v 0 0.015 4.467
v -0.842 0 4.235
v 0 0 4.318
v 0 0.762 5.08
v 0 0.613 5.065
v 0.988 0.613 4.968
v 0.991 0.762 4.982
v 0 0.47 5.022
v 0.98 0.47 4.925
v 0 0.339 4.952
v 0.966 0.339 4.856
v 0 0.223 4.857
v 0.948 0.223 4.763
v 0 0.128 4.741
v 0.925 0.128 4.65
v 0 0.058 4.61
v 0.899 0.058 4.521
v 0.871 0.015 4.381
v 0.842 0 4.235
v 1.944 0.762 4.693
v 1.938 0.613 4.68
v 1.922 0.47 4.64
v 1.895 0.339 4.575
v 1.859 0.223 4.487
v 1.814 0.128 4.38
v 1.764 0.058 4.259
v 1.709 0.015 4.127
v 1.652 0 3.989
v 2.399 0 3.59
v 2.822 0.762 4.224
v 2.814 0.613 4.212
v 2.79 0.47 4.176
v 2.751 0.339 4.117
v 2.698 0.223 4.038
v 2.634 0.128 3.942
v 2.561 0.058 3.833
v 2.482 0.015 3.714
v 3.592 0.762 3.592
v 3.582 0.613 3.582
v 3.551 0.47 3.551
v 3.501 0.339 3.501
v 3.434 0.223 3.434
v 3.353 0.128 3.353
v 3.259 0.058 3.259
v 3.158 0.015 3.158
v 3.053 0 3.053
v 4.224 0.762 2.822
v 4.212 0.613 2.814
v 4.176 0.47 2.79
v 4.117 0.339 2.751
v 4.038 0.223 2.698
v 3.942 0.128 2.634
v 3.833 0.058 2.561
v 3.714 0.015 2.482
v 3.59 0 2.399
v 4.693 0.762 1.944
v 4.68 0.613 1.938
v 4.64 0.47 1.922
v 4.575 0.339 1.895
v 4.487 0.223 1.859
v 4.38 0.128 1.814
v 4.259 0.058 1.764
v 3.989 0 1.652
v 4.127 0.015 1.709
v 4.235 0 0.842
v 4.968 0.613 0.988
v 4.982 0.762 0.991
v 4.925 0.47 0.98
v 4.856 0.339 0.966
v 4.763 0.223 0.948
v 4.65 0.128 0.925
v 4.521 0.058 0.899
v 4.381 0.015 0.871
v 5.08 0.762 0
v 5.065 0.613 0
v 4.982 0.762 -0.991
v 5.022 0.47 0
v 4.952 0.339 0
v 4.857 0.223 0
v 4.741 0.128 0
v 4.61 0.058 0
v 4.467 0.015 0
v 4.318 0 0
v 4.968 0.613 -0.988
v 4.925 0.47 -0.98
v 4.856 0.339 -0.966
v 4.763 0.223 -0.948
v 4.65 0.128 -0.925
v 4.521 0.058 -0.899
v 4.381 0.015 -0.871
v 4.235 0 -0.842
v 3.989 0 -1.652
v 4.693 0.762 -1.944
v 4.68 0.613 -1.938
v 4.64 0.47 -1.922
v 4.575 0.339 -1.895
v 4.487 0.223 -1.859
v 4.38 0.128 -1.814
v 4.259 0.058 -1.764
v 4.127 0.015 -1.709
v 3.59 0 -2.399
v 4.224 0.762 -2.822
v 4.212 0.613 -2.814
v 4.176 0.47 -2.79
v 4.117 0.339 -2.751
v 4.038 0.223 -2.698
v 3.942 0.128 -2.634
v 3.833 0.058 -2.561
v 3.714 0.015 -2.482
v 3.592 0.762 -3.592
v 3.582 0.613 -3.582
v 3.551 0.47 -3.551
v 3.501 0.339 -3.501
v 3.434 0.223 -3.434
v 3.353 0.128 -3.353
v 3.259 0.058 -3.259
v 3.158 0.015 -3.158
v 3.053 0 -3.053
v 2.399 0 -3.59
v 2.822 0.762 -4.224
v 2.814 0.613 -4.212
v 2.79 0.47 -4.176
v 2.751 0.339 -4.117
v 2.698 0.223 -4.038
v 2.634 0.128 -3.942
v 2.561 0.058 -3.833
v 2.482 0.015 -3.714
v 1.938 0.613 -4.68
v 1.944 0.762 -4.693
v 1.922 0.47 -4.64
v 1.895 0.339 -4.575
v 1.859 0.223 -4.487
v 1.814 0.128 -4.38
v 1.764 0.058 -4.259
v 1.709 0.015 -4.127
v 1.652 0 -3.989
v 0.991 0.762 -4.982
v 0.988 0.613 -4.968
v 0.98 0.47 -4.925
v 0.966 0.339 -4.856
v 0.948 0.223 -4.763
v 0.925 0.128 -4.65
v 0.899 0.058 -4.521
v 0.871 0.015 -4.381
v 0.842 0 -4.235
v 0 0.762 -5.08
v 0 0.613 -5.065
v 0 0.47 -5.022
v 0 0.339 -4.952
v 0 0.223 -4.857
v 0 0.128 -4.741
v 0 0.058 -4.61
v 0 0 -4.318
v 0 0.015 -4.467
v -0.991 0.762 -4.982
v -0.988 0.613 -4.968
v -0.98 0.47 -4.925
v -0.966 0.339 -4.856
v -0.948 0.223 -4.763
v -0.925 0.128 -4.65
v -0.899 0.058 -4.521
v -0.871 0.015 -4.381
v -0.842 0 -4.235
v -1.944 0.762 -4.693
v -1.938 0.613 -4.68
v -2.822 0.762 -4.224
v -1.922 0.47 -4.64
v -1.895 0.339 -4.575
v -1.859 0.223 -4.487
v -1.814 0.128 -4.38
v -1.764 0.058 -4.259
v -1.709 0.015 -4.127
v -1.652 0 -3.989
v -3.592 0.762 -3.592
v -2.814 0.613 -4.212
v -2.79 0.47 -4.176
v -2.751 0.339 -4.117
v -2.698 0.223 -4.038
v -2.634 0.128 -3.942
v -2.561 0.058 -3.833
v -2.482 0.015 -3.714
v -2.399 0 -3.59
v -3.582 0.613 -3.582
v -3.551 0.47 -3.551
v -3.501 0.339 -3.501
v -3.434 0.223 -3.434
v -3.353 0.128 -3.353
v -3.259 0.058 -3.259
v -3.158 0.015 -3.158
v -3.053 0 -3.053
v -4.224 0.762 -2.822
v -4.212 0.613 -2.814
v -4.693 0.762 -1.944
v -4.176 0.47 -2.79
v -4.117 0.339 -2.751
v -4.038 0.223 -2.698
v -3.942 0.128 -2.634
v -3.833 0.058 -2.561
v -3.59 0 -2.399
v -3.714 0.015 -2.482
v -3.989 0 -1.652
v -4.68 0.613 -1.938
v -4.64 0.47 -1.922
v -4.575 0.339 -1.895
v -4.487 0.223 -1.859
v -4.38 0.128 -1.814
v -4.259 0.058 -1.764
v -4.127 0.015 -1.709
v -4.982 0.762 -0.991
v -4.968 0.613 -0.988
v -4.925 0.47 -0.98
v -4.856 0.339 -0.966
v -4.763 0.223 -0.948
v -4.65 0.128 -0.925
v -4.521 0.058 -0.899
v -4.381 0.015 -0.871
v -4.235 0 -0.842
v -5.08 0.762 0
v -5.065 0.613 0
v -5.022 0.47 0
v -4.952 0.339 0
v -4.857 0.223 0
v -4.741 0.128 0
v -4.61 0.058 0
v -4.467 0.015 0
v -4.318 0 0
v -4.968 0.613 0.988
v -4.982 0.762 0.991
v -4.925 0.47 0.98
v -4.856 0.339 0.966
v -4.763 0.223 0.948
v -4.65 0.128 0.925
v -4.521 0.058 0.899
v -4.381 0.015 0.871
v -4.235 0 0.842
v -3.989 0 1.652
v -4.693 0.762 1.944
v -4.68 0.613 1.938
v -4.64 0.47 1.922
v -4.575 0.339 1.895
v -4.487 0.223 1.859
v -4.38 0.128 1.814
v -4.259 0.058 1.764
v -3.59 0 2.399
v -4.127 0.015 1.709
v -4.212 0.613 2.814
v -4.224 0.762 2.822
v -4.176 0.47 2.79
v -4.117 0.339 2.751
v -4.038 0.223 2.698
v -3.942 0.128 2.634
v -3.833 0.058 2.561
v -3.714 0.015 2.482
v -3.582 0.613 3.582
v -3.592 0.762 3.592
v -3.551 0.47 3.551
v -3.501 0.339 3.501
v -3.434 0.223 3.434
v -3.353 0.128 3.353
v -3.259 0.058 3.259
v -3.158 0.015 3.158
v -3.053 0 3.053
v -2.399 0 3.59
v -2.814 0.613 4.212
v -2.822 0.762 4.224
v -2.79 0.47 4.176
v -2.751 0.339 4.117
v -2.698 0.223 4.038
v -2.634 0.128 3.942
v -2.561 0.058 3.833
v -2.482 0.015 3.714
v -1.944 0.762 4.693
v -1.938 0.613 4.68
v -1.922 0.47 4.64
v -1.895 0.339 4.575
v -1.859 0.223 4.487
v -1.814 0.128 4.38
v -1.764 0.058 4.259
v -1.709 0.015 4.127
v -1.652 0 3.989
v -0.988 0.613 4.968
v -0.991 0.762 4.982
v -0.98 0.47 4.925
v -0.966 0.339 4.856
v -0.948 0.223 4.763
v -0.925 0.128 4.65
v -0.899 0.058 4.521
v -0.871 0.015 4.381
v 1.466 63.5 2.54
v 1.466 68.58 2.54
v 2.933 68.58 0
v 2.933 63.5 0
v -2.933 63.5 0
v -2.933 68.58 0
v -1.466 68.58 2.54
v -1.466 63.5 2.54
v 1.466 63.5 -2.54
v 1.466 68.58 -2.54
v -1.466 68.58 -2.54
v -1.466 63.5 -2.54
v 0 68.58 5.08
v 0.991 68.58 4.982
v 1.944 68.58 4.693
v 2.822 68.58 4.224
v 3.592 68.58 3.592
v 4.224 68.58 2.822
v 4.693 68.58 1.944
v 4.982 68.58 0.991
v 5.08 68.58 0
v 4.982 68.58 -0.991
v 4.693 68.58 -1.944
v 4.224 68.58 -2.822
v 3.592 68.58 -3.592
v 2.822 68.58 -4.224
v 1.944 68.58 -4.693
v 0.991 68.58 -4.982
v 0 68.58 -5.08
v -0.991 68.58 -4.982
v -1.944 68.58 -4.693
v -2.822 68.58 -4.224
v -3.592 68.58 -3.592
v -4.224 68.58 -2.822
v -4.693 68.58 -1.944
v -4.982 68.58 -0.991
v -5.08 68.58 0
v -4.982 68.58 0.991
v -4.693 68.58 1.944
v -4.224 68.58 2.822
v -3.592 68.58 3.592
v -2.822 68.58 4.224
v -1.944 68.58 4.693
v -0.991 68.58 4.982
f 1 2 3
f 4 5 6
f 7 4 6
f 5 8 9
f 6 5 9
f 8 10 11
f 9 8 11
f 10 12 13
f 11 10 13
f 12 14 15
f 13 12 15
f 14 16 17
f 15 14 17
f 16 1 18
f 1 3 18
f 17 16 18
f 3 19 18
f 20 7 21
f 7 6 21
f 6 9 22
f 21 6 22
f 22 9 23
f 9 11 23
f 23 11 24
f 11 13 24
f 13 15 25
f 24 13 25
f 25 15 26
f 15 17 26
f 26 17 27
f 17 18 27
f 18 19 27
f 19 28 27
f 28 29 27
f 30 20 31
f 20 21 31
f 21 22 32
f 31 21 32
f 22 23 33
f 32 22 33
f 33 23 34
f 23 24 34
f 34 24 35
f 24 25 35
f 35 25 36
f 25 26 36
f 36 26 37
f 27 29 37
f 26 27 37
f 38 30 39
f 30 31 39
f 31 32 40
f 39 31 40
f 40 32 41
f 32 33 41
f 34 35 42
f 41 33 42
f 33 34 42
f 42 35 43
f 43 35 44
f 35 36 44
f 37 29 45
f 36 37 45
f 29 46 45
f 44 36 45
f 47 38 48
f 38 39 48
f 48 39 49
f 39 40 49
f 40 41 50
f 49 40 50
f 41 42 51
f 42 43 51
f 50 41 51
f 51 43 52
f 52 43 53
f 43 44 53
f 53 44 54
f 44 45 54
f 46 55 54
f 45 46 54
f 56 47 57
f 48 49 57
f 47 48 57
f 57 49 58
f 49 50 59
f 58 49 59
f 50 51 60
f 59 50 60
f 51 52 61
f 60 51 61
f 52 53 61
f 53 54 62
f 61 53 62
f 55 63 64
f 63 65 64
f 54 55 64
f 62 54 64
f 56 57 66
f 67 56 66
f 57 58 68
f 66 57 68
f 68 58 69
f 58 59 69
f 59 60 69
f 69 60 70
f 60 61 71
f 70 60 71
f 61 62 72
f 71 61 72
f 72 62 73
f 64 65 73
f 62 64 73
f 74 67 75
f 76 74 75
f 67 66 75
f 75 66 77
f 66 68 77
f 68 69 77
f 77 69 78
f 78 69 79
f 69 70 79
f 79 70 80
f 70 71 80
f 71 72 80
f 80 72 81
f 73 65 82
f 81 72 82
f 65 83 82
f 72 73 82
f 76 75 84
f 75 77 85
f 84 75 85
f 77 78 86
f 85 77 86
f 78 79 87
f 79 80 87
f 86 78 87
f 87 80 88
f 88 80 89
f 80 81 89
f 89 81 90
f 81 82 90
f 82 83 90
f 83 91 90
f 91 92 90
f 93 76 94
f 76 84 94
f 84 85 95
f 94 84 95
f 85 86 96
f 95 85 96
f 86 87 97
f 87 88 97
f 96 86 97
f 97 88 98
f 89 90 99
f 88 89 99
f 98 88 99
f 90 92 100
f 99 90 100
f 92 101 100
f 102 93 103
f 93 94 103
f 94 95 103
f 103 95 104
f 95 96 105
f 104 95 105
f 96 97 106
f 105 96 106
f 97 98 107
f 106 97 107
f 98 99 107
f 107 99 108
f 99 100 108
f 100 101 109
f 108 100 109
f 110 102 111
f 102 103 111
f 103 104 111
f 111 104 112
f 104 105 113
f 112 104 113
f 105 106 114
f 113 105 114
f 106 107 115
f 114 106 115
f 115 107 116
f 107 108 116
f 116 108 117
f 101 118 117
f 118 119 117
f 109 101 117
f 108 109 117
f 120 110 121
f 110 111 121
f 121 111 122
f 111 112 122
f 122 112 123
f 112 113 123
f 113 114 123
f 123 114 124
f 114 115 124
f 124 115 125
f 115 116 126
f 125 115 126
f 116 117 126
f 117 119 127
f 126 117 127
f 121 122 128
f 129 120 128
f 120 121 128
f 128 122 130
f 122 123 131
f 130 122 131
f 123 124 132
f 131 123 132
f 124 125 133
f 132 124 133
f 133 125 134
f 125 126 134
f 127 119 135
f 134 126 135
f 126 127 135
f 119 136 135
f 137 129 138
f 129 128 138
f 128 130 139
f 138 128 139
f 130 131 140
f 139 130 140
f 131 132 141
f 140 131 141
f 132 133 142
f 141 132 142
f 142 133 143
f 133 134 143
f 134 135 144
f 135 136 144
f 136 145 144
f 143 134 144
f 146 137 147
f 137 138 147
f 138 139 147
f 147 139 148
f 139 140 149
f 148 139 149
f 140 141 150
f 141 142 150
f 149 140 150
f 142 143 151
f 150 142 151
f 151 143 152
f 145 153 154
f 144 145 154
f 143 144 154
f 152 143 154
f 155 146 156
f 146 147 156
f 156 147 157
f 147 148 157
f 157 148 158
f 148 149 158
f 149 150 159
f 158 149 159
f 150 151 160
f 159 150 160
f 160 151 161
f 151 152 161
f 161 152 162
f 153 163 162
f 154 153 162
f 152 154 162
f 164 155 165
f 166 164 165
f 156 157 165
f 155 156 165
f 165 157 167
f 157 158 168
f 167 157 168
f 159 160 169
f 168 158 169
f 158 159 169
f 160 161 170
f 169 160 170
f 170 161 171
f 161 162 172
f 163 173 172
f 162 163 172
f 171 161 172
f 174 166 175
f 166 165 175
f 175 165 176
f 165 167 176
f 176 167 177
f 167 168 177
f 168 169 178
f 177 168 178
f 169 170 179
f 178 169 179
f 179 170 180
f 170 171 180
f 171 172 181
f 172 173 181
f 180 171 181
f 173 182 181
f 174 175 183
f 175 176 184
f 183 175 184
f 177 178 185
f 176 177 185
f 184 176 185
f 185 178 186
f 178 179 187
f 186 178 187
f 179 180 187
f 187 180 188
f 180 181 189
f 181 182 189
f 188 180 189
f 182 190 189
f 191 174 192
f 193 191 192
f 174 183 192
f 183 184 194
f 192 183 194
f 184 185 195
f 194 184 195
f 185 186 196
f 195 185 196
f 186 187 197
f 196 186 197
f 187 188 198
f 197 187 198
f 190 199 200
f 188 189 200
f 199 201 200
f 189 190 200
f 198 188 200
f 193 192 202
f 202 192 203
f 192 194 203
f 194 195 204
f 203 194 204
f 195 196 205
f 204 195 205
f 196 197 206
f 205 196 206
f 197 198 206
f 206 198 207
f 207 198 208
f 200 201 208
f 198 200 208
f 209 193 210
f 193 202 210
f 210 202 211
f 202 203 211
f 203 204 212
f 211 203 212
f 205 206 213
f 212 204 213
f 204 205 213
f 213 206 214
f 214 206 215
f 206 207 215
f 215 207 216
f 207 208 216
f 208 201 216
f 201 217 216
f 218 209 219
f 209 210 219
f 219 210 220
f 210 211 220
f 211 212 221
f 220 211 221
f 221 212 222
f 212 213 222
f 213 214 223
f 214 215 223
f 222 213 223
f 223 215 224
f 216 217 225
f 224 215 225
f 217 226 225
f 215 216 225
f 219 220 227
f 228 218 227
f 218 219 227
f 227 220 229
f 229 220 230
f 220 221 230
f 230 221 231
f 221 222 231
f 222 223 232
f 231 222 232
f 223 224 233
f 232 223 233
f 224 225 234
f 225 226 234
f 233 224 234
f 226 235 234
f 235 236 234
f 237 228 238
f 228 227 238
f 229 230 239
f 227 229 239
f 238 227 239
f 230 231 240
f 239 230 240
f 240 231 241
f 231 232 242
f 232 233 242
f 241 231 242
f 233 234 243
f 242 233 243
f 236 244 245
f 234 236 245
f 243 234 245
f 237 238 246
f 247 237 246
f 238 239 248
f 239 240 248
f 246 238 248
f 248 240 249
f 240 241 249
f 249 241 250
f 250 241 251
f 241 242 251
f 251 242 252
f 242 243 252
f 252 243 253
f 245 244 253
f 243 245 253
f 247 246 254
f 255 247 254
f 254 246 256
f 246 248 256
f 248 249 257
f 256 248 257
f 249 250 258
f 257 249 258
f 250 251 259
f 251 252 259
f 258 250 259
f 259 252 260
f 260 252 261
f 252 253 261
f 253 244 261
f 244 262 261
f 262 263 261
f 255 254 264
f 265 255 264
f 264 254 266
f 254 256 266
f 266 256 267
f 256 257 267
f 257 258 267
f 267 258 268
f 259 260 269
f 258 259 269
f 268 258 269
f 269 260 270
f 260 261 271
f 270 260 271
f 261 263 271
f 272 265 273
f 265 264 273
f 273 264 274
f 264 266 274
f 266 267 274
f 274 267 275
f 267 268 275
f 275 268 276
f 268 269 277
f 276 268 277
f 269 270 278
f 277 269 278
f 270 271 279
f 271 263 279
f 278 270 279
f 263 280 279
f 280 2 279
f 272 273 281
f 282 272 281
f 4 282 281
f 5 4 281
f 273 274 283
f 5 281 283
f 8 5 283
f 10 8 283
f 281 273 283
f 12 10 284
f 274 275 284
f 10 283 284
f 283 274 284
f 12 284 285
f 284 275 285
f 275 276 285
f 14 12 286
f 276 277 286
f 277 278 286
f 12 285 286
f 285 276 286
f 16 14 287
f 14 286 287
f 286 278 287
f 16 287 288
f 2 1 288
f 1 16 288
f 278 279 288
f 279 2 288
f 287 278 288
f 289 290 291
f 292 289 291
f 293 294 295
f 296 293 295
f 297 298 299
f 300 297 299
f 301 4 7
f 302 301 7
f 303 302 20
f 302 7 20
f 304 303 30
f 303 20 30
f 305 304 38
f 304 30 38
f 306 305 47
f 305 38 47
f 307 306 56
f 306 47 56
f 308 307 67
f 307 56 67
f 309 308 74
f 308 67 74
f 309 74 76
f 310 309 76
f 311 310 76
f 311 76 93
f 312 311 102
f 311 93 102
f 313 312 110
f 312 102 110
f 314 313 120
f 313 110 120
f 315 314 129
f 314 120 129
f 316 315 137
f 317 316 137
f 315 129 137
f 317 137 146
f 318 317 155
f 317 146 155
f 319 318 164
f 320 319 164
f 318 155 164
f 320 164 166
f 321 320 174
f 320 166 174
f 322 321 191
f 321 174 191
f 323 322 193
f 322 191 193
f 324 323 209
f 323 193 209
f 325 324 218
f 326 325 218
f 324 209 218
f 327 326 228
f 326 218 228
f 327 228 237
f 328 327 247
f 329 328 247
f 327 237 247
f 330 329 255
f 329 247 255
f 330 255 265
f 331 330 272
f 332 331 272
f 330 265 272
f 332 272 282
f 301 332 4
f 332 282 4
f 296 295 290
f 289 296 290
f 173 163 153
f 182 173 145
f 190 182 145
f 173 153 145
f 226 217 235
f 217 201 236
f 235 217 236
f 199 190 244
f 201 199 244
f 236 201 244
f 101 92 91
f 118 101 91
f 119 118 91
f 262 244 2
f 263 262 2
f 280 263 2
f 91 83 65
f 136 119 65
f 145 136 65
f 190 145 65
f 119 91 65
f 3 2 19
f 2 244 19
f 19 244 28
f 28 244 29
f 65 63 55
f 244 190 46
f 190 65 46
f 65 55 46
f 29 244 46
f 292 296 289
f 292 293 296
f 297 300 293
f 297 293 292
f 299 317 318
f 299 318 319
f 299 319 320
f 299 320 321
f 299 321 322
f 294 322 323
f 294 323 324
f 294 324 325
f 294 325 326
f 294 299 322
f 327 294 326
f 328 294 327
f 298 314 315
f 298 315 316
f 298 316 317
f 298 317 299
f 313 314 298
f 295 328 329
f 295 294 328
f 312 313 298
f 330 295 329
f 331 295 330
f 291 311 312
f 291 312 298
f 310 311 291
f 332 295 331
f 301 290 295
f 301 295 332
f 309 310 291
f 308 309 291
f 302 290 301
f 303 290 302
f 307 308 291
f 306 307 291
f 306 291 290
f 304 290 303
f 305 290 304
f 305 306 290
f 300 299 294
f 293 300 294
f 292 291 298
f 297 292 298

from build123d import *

# Parameters (mm, degrees)
SKETCH1_R           = 5.08
BOSS_EXTRUDE1_DEPTH = 68.58
CUT_EXTRUDE1_DEPTH  = 5.08
FILLET1_R           = 0.762


with BuildPart() as part:
    # Sketch1 → Boss-Extrude1 (new body)
    with BuildSketch(Plane(origin=(0, 0, 0), x_dir=(1, 0, 0), z_dir=(0, 1, 0))):
        with Locations(Location((0, 0, 0), (0, 0, 270))):
            Circle(SKETCH1_R)
    extrude(amount=BOSS_EXTRUDE1_DEPTH)

    # Sketch2 → Cut-Extrude1 (cut)
    with BuildSketch(Plane(origin=(0, 68.58, 0), x_dir=(1, 0, 0), z_dir=(0, 1, 0))):
        Polygon((-1.466469684, -2.54), (1.466469684, -2.54), (2.932939367, 0), (1.466469684, 2.54), (-1.466469684, 2.54), (-2.932939367, 0), align=None)
    extrude(amount=-CUT_EXTRUDE1_DEPTH, mode=Mode.SUBTRACT)

    # Fillet1
    fillet1_edges = [part.edges().sort_by_distance(p)[0] for p in [
        (0, 0, -5.08),
    ]]
    fillet(fillet1_edges, radius=FILLET1_R)


solid = part.part
